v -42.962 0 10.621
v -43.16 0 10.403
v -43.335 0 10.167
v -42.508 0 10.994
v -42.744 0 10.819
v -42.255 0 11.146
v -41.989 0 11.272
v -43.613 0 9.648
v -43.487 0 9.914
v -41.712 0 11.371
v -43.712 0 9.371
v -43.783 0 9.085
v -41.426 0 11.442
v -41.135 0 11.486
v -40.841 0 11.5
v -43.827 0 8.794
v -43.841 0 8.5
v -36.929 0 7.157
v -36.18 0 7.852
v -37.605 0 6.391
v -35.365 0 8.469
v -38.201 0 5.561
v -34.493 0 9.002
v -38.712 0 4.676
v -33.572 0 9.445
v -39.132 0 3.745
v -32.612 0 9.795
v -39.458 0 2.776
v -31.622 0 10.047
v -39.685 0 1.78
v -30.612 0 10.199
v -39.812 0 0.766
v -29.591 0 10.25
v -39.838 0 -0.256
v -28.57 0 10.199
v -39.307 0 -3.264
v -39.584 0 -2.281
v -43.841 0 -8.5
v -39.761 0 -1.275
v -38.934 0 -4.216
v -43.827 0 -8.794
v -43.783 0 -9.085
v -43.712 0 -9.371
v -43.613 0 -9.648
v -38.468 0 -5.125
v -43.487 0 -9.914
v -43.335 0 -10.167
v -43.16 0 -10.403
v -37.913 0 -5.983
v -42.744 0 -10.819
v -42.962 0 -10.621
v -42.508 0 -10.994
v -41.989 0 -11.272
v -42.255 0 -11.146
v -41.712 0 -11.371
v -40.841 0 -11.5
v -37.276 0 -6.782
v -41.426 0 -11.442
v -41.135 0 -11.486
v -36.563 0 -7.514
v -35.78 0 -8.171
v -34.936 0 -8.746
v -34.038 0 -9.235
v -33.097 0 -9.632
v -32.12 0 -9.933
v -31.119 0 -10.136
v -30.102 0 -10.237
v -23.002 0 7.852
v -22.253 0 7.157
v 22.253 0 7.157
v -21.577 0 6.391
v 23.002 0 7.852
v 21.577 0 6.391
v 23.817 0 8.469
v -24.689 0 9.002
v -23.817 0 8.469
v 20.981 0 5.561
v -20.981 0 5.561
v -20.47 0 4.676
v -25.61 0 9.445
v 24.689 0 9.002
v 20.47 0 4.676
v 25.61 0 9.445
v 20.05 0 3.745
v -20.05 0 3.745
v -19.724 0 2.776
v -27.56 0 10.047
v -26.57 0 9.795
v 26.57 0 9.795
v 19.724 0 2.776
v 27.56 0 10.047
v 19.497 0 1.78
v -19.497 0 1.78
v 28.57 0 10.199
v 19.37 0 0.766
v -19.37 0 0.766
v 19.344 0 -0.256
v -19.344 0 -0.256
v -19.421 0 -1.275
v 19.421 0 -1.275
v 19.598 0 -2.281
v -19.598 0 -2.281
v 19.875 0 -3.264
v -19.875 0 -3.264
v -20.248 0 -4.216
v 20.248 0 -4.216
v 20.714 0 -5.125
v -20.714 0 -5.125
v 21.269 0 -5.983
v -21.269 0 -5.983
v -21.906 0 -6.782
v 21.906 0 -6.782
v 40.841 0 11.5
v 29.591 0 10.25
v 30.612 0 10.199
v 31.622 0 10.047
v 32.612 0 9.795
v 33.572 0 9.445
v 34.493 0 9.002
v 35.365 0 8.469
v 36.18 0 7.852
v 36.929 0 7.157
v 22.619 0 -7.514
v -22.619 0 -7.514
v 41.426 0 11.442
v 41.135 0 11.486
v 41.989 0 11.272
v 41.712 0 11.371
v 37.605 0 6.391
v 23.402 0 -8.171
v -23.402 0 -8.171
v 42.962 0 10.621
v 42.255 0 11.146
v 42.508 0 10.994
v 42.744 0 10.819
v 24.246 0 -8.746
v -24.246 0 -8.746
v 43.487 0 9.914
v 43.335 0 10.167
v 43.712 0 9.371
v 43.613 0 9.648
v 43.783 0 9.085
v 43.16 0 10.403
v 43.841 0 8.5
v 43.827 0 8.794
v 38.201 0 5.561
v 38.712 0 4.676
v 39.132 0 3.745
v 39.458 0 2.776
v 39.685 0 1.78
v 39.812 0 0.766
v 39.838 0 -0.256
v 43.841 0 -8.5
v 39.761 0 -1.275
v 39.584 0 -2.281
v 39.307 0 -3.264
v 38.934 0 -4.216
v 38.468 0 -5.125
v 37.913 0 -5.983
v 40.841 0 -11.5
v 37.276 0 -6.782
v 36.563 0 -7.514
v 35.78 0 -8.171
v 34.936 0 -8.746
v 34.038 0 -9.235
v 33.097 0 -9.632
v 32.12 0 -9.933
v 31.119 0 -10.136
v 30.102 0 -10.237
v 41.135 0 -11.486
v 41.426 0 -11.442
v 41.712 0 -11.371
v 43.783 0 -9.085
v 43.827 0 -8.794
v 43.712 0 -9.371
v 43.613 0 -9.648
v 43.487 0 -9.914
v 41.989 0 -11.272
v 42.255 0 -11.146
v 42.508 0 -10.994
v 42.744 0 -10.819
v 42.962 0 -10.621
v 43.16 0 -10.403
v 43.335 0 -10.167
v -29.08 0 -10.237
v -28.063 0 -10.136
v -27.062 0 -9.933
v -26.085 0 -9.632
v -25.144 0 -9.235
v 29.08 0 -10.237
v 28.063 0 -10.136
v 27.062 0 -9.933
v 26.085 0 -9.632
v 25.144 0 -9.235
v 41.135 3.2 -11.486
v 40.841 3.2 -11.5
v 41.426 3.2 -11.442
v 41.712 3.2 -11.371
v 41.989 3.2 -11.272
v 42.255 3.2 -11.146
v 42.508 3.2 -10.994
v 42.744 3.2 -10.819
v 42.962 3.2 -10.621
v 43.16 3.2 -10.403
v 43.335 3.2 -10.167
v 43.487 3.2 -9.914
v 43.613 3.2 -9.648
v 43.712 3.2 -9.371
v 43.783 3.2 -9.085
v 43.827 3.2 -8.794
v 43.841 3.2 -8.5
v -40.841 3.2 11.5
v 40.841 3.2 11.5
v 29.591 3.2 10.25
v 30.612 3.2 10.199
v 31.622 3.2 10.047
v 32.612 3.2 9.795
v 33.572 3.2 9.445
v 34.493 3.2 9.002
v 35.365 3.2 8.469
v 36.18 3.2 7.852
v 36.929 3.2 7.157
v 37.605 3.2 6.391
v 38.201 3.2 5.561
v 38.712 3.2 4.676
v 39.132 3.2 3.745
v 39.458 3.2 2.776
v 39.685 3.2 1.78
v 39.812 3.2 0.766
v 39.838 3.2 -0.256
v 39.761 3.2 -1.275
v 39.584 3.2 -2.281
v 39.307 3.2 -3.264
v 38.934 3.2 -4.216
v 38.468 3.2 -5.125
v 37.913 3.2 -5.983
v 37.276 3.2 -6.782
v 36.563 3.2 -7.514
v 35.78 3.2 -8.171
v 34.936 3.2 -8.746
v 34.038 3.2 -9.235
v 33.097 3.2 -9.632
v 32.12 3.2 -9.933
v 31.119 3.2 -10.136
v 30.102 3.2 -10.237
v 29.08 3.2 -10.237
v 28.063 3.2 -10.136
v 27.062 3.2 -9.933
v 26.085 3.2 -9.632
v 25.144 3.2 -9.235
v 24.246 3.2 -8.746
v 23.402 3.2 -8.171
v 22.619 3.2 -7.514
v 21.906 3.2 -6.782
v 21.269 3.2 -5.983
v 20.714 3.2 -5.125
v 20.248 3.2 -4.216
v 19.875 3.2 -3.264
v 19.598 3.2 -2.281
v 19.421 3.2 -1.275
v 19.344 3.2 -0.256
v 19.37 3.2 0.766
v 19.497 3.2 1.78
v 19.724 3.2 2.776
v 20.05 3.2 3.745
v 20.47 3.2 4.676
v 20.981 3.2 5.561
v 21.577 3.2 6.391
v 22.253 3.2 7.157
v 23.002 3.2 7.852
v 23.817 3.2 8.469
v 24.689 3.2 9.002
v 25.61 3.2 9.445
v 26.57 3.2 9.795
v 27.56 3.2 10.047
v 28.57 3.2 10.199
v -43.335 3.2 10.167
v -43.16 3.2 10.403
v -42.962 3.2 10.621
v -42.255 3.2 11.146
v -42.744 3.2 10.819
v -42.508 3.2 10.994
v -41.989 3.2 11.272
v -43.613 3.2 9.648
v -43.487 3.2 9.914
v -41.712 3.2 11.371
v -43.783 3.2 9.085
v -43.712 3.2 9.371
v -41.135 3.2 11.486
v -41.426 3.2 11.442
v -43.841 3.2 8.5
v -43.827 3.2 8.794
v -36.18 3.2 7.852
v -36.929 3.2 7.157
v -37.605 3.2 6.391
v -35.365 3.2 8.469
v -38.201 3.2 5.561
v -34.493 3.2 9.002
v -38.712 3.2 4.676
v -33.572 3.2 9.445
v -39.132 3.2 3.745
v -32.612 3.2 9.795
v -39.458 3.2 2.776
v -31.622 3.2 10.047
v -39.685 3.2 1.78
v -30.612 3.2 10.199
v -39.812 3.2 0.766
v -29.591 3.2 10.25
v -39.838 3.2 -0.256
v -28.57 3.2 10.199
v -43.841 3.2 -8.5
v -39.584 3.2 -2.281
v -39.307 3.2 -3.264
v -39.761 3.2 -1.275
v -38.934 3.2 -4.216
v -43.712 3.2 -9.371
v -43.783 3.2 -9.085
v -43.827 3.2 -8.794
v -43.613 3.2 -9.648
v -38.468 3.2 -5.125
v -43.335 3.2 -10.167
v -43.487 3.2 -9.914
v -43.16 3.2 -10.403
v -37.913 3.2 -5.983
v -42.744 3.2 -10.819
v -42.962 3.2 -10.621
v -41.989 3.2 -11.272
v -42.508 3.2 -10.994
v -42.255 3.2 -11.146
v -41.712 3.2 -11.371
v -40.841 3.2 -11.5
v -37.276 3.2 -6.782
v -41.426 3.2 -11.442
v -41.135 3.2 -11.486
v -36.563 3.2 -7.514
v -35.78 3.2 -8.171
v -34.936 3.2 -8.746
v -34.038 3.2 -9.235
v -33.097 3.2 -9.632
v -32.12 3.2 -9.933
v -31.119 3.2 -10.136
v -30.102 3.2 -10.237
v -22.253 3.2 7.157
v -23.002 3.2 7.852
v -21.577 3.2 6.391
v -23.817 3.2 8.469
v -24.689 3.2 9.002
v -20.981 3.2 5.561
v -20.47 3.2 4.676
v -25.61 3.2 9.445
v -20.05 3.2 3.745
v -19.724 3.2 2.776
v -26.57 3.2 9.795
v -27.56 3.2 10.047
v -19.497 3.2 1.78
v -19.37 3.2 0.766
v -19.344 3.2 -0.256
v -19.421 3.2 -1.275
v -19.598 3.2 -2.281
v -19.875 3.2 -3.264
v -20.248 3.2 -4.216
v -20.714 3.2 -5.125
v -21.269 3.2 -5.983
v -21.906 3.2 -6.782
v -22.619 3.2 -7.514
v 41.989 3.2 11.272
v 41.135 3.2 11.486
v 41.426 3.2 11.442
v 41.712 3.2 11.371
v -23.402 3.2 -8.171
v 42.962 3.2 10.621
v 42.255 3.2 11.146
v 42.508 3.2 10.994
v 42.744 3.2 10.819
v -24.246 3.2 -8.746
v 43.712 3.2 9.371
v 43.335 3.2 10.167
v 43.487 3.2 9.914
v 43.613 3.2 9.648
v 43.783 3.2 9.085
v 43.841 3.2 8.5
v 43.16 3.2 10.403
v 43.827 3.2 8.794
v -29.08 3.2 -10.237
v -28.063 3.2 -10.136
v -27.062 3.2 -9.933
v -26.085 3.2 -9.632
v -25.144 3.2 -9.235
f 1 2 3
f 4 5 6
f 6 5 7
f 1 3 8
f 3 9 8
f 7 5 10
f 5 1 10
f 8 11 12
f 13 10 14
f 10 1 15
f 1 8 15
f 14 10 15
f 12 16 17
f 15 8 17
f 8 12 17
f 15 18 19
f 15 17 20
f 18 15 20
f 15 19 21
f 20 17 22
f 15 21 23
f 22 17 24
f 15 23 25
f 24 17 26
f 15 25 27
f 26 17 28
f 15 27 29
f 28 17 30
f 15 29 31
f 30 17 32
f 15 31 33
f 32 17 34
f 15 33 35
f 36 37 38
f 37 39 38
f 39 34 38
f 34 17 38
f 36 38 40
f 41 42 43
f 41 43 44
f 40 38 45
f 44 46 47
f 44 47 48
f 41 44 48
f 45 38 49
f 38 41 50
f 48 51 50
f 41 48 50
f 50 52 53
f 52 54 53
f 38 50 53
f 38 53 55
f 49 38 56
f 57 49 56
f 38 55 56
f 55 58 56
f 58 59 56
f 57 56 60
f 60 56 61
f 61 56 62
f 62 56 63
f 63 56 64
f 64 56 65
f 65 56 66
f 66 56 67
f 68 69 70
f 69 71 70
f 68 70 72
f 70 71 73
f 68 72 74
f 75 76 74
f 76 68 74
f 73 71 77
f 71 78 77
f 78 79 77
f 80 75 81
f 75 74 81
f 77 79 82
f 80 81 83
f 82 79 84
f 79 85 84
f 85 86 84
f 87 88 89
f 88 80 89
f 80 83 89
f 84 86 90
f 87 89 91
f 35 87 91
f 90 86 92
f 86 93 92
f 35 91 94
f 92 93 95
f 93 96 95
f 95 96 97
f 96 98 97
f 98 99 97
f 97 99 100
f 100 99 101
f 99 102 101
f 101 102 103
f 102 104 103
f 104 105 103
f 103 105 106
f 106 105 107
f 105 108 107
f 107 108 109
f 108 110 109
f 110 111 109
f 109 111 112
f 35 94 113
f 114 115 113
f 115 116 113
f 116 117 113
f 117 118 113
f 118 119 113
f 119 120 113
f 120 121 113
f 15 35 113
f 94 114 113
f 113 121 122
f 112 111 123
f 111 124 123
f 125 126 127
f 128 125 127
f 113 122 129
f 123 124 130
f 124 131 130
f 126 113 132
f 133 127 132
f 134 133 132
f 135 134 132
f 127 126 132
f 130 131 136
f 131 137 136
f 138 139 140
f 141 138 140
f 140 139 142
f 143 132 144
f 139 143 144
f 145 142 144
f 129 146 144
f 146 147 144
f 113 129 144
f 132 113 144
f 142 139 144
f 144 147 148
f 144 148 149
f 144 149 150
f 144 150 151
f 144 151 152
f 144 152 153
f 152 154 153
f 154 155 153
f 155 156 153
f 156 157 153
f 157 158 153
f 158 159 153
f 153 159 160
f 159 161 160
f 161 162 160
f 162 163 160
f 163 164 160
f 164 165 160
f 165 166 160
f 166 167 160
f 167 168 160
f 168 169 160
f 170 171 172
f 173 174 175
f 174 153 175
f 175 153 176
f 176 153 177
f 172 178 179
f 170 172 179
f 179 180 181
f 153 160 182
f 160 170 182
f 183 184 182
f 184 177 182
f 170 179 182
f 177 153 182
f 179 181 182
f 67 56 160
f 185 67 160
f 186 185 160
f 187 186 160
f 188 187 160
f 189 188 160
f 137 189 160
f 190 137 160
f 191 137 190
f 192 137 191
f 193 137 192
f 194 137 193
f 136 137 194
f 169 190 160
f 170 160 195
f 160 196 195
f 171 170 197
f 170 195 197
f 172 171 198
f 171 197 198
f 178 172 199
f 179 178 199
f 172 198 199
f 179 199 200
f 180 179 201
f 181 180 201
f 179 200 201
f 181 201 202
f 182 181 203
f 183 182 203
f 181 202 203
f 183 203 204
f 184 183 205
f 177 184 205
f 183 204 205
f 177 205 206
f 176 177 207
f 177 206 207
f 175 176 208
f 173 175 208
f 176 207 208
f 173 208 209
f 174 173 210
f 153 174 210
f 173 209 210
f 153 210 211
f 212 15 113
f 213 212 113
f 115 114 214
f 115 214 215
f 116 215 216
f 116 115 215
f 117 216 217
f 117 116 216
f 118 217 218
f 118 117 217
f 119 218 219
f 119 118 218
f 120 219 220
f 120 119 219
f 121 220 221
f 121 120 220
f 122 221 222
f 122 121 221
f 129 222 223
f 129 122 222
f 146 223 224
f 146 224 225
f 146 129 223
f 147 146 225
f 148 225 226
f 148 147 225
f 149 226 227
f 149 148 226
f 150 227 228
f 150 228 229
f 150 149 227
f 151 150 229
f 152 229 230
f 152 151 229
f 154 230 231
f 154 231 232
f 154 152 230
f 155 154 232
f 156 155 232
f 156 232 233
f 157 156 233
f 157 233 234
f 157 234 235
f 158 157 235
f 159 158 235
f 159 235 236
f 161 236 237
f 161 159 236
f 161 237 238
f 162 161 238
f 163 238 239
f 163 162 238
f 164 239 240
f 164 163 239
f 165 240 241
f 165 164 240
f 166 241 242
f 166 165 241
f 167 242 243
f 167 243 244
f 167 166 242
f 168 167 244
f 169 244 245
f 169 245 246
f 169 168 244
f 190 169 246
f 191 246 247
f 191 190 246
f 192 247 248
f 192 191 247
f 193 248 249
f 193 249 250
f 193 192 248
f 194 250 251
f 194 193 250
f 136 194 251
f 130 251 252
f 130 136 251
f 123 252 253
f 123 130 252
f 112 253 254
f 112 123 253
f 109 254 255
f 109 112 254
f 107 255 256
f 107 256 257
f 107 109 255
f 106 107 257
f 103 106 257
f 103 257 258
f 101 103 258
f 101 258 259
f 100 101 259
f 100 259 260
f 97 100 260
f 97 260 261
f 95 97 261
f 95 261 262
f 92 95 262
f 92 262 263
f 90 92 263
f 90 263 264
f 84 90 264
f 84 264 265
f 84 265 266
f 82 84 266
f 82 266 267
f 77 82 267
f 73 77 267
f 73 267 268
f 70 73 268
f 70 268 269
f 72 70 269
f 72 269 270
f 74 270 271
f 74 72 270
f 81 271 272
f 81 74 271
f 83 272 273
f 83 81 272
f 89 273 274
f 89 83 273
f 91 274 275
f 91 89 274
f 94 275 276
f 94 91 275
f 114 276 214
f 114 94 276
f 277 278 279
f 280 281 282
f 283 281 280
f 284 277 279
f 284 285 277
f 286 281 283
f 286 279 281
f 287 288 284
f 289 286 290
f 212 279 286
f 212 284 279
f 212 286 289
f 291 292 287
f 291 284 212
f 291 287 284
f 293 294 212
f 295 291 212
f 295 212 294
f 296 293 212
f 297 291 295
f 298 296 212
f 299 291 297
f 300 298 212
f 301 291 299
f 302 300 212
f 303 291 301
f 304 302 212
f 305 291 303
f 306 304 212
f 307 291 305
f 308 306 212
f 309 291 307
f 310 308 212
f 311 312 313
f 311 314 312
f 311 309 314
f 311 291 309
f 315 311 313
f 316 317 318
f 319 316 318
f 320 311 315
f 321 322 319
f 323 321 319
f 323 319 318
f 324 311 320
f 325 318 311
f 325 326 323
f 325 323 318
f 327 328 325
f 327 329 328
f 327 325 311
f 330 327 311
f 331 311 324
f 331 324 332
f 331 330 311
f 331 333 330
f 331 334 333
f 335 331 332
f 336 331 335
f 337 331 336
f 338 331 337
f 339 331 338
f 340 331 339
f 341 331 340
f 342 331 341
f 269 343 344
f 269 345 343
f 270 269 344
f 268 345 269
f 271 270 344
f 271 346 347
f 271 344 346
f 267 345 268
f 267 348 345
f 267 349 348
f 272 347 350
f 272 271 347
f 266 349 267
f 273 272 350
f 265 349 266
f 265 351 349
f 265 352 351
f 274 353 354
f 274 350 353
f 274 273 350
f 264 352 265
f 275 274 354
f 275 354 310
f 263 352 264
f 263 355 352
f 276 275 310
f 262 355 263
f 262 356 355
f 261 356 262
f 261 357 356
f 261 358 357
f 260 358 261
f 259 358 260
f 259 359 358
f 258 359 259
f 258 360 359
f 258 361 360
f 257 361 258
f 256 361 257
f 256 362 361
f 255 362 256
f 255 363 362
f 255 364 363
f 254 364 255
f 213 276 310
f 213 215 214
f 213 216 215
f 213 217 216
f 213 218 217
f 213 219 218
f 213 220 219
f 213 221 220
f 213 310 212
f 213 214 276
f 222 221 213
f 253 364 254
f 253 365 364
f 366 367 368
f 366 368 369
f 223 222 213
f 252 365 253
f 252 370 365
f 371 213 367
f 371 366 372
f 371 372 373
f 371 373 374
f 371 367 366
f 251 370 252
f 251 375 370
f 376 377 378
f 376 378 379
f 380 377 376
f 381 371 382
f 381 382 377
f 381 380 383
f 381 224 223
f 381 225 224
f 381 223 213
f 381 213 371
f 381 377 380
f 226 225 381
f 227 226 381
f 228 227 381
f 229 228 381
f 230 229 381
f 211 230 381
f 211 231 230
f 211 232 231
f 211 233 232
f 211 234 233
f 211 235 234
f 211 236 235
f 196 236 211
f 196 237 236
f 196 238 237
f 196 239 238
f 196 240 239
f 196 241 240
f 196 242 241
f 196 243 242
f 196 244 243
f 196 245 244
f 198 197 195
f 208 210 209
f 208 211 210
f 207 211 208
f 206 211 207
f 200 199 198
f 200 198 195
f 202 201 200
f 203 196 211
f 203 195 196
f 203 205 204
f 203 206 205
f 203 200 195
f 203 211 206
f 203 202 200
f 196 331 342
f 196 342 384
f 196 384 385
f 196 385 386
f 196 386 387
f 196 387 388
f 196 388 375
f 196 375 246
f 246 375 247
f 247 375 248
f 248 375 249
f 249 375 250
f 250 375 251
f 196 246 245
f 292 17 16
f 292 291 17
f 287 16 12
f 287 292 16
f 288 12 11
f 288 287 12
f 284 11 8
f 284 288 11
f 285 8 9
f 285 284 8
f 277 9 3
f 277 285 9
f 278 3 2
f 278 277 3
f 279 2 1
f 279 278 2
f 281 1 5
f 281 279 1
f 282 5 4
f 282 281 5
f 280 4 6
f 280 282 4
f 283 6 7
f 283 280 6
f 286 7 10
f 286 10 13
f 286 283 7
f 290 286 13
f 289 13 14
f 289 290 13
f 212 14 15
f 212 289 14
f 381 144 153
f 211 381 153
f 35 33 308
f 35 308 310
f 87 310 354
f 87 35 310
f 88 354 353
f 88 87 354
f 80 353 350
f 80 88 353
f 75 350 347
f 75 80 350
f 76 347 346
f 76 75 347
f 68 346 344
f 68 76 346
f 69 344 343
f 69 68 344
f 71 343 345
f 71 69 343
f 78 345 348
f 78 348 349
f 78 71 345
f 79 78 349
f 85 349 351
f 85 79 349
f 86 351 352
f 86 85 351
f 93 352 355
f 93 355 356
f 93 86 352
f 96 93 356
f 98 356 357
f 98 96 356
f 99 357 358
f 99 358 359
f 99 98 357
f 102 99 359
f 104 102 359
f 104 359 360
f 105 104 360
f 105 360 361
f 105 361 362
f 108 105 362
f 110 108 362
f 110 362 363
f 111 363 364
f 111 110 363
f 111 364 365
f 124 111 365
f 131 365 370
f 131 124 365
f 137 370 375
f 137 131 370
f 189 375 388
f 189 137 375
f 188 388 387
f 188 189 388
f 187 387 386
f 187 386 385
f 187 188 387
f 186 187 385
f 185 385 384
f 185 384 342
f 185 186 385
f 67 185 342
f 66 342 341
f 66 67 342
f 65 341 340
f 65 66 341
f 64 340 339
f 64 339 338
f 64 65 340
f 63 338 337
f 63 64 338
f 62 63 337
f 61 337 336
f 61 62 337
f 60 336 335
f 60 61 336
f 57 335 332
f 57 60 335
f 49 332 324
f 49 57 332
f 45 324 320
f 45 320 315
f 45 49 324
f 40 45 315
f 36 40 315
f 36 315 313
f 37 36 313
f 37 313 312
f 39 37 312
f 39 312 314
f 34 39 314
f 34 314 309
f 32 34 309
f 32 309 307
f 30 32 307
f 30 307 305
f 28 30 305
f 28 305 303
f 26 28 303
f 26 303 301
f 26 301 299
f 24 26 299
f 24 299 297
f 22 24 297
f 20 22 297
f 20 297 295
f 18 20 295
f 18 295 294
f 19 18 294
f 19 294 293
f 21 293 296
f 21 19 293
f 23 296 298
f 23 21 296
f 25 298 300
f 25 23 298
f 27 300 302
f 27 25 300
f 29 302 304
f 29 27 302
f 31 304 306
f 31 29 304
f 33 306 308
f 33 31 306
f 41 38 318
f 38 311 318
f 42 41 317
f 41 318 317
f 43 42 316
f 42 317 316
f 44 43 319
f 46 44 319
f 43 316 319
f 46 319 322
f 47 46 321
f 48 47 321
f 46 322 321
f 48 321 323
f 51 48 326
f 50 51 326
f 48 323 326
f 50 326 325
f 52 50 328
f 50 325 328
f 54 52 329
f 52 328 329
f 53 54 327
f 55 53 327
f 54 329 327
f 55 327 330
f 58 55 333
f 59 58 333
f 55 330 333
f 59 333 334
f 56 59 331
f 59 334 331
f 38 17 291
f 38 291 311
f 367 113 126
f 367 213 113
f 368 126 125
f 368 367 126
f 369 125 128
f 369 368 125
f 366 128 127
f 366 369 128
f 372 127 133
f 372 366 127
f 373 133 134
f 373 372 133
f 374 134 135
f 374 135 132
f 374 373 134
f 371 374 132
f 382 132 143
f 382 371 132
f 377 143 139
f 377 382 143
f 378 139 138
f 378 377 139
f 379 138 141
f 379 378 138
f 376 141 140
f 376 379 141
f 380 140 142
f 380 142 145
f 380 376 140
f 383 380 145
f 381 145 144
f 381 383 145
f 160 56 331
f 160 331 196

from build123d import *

# Parameters (mm, degrees)
SKETCH1_W           = 87.682
SKETCH1_H           = 23
SKETCH1_R           = 10.25
BOSS_EXTRUDE1_DEPTH = 3.2
FILLET1_R           = 3


with BuildPart() as part:
    # Sketch1 → Boss-Extrude1 (new body)
    with BuildSketch(Plane(origin=(0, 0, 0), x_dir=(1, 0, 0), z_dir=(0, 1, 0))):
        Rectangle(SKETCH1_W, SKETCH1_H)
        with Locations(Location((29.591, 0, 0), (0, 0, 270))):
            Circle(SKETCH1_R, mode=Mode.SUBTRACT)
        with Locations(Location((-29.591, 0, 0), (0, 0, 270))):
            Circle(SKETCH1_R, mode=Mode.SUBTRACT)
    extrude(amount=BOSS_EXTRUDE1_DEPTH)

    # Fillet1
    fillet1_edges = [part.edges().sort_by_distance(p)[0] for p in [
        (43.841, 1.6, -11.5),
        (43.841, 1.6, 11.5),
        (-43.841, 1.6, 11.5),
        (-43.841, 1.6, -11.5),
    ]]
    fillet(fillet1_edges, radius=FILLET1_R)


solid = part.part
